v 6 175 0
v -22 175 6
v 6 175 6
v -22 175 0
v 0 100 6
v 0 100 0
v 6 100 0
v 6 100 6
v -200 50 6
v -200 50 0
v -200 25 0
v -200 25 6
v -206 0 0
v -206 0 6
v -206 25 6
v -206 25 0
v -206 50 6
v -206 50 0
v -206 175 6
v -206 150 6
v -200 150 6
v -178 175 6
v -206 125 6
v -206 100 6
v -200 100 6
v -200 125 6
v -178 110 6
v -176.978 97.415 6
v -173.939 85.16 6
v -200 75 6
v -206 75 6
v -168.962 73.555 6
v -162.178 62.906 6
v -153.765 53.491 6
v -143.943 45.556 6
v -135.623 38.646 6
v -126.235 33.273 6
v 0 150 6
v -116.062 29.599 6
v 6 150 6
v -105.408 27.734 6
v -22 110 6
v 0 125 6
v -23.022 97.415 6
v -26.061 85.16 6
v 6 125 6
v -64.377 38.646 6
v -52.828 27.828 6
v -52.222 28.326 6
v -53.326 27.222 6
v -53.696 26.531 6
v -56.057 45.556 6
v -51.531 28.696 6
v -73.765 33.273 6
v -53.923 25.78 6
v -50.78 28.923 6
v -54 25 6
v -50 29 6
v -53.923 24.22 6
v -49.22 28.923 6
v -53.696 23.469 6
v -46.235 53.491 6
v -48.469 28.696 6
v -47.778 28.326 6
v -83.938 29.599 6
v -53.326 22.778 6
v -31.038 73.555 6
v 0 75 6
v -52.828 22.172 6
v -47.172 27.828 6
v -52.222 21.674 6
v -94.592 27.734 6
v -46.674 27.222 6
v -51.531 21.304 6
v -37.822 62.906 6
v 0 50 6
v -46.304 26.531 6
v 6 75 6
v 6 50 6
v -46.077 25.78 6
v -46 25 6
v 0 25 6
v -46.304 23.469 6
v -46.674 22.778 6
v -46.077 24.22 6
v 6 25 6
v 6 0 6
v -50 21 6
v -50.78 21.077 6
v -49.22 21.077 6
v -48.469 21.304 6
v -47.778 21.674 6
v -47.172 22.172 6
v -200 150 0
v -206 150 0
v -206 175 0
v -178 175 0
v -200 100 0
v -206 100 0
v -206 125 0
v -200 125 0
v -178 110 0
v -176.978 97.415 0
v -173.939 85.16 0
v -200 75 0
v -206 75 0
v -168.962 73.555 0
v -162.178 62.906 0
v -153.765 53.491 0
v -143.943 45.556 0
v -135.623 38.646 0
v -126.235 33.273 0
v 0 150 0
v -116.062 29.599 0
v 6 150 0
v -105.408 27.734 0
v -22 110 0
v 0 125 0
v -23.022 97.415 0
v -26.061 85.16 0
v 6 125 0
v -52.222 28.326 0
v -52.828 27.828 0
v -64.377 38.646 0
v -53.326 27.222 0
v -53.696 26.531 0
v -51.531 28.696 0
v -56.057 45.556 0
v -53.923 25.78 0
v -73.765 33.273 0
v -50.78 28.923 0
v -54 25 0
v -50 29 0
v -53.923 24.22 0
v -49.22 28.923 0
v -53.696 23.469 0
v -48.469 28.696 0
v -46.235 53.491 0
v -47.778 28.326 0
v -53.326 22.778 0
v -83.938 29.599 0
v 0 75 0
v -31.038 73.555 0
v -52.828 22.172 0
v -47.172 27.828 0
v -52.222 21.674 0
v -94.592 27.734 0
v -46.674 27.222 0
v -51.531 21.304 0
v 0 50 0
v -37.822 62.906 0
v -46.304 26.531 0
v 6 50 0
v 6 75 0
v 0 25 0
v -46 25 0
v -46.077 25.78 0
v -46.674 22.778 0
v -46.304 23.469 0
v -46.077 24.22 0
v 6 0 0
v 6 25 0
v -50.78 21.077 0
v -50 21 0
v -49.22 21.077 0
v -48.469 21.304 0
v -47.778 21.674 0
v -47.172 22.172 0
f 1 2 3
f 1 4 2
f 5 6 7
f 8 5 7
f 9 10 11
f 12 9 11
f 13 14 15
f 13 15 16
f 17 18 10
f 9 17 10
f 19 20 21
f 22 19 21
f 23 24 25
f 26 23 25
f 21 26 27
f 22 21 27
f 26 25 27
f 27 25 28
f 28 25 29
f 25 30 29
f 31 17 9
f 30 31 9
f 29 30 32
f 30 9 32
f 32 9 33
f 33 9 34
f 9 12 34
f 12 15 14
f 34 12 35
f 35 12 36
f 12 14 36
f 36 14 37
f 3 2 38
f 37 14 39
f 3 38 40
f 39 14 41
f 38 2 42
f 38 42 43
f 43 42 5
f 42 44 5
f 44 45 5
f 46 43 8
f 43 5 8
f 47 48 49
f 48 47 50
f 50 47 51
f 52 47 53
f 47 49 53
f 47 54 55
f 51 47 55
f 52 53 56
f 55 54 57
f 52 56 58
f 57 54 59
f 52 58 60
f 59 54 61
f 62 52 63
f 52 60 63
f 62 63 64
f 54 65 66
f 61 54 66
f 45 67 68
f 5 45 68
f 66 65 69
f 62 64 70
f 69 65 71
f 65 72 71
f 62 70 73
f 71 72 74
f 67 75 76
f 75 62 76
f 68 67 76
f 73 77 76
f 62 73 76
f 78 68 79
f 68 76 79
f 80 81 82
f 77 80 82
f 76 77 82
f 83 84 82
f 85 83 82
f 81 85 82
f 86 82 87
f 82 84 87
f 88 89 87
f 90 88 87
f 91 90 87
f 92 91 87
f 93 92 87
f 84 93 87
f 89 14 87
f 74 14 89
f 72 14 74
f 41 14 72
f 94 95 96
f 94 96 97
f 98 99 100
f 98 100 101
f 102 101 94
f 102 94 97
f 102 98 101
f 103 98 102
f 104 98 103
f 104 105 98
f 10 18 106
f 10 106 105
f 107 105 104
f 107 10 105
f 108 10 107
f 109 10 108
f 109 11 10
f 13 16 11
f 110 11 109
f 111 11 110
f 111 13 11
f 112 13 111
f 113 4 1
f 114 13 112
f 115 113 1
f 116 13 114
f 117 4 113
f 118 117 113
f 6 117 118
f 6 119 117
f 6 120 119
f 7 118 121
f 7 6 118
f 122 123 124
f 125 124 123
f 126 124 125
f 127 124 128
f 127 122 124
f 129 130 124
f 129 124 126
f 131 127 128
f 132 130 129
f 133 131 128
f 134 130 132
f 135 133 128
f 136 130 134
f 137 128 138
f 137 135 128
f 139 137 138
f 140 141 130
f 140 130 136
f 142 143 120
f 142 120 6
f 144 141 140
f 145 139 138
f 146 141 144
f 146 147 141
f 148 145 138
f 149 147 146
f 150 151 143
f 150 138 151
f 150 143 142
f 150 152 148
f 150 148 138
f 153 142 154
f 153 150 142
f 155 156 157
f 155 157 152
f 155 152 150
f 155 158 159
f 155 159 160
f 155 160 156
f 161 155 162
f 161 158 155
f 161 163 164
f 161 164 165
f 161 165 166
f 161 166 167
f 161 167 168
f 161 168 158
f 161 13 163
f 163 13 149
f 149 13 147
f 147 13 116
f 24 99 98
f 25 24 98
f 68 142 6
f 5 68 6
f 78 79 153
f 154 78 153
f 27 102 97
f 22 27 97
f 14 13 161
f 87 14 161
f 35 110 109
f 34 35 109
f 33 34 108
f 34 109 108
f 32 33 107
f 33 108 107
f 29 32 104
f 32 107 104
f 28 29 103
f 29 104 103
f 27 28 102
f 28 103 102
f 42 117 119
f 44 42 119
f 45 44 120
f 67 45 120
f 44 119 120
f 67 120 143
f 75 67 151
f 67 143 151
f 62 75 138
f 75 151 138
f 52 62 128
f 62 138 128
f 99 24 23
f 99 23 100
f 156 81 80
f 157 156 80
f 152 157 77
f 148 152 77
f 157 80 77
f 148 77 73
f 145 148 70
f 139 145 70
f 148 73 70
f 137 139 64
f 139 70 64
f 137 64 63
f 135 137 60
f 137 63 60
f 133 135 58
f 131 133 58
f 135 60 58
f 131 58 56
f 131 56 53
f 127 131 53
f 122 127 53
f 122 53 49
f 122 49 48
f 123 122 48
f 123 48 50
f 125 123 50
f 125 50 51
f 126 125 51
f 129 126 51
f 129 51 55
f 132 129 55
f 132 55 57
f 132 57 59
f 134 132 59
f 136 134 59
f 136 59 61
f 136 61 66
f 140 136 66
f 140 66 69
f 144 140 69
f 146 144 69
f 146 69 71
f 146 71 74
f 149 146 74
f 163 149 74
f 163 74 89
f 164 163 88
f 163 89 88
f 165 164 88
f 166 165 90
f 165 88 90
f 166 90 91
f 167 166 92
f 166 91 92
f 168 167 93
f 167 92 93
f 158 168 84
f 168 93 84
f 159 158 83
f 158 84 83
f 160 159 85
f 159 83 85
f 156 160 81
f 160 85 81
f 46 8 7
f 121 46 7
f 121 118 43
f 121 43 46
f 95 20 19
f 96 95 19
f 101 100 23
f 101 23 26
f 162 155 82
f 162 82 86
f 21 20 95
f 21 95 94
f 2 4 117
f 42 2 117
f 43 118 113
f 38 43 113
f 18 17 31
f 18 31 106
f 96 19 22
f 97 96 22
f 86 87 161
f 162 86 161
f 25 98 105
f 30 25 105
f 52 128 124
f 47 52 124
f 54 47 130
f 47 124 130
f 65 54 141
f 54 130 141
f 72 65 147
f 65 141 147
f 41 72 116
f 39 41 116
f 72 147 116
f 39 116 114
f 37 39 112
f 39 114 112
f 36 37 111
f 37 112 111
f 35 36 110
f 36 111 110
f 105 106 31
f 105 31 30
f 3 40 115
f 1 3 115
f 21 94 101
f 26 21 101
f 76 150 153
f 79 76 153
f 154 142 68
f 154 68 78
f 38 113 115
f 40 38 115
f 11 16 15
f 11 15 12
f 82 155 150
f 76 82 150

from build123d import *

# Parameters (mm, degrees)
BOSS_EXTRUDE1_DEPTH   = 6
SKETCH2_W             = 6
SKETCH2_H             = 25
BOSS_EXTRUDE2_DEPTH   = 6
LPATTERN1_OUTLINE_W   = 6
LPATTERN1_OUTLINE_H   = 6
LPATTERN1_DEPTH       = 25
LPATTERN1_START       = 50
LPATTERN1_2_OUTLINE_W = 6
LPATTERN1_2_OUTLINE_H = 6
LPATTERN1_2_DEPTH     = 25
LPATTERN1_START_2     = 100
LPATTERN1_3_OUTLINE_W = 6
LPATTERN1_3_OUTLINE_H = 6
LPATTERN1_3_DEPTH     = 25
LPATTERN1_START_3     = 150
LPATTERN1_4_OUTLINE_W = 6
LPATTERN1_4_OUTLINE_H = 6
LPATTERN1_4_DEPTH     = 25
SKETCH5_R             = 4
CUT_EXTRUDE1_DEPTH    = 271.364568685


# Read off the part's stored shape, not the designer's step: LPattern1
with BuildPart() as part:
    # Sketch1 → Boss-Extrude1 (new body)
    with BuildSketch(Plane.XY):
        with BuildLine():
            Line((-178, 175), (-200, 175))
            Line((-200, 175), (-200, 0))
            Line((-200, 0), (0, 0))
            Line((0, 0), (0, 175))
            Line((0, 175), (-22, 175))
            Line((-22, 175), (-22, 110))
            ThreePointArc((-22, 110), (-31.037807258, 73.555302549), (-56.056819802, 45.55625))
            ThreePointArc((-56.056819802, 45.55625), (-100, 27.5), (-143.943180198, 45.55625))
            ThreePointArc((-143.943180198, 45.55625), (-168.962192742, 73.555302549), (-178, 110))
            Line((-178, 110), (-178, 175))
        make_face()
    extrude(amount=BOSS_EXTRUDE1_DEPTH)

    # Sketch2 → Boss-Extrude2 (add)
    with BuildSketch(Plane.XY.offset(6)):
        with Locations((-203, 162.5)):
            Rectangle(SKETCH2_W, SKETCH2_H)
    extrude(amount=-BOSS_EXTRUDE2_DEPTH)

    # LPattern1 outline → LPattern1 (add)
    with BuildSketch(Plane(origin=(0, 0, 0), x_dir=(1, 0, 0), z_dir=(0, 1, 0))):
        with Locations((-203, -3)):
            Rectangle(LPATTERN1_OUTLINE_W, LPATTERN1_OUTLINE_H)
        with Locations((3, -3)):
            Rectangle(LPATTERN1_OUTLINE_W, LPATTERN1_OUTLINE_H)
    extrude(amount=LPATTERN1_DEPTH)

    # LPattern1 2 outline → LPattern1 2 (add)
    with BuildSketch(Plane(origin=(0, 0, 0), x_dir=(1, 0, 0), z_dir=(0, 1, 0)).offset(LPATTERN1_START)):
        with Locations((-203, -3)):
            Rectangle(LPATTERN1_2_OUTLINE_W, LPATTERN1_2_OUTLINE_H)
        with Locations((3, -3)):
            Rectangle(LPATTERN1_2_OUTLINE_W, LPATTERN1_2_OUTLINE_H)
    extrude(amount=LPATTERN1_2_DEPTH)

    # LPattern1 3 outline → LPattern1 3 (add)
    with BuildSketch(Plane(origin=(0, 0, 0), x_dir=(1, 0, 0), z_dir=(0, 1, 0)).offset(LPATTERN1_START_2)):
        with Locations((-203, -3)):
            Rectangle(LPATTERN1_3_OUTLINE_W, LPATTERN1_3_OUTLINE_H)
        with Locations((3, -3)):
            Rectangle(LPATTERN1_3_OUTLINE_W, LPATTERN1_3_OUTLINE_H)
    extrude(amount=LPATTERN1_3_DEPTH)

    # LPattern1 4 outline → LPattern1 4 (add)
    with BuildSketch(Plane(origin=(0, 0, 0), x_dir=(1, 0, 0), z_dir=(0, 1, 0)).offset(LPATTERN1_START_3)):
        with Locations((3, -3)):
            Rectangle(LPATTERN1_4_OUTLINE_W, LPATTERN1_4_OUTLINE_H)
    extrude(amount=LPATTERN1_4_DEPTH)

    # Sketch5 → Cut-Extrude1 (cut, through all)
    with BuildSketch(Plane.XY.offset(6)):
        with Locations((-50, 25)):
            Circle(SKETCH5_R)
    extrude(amount=-CUT_EXTRUDE1_DEPTH, mode=Mode.SUBTRACT)


solid = part.part
